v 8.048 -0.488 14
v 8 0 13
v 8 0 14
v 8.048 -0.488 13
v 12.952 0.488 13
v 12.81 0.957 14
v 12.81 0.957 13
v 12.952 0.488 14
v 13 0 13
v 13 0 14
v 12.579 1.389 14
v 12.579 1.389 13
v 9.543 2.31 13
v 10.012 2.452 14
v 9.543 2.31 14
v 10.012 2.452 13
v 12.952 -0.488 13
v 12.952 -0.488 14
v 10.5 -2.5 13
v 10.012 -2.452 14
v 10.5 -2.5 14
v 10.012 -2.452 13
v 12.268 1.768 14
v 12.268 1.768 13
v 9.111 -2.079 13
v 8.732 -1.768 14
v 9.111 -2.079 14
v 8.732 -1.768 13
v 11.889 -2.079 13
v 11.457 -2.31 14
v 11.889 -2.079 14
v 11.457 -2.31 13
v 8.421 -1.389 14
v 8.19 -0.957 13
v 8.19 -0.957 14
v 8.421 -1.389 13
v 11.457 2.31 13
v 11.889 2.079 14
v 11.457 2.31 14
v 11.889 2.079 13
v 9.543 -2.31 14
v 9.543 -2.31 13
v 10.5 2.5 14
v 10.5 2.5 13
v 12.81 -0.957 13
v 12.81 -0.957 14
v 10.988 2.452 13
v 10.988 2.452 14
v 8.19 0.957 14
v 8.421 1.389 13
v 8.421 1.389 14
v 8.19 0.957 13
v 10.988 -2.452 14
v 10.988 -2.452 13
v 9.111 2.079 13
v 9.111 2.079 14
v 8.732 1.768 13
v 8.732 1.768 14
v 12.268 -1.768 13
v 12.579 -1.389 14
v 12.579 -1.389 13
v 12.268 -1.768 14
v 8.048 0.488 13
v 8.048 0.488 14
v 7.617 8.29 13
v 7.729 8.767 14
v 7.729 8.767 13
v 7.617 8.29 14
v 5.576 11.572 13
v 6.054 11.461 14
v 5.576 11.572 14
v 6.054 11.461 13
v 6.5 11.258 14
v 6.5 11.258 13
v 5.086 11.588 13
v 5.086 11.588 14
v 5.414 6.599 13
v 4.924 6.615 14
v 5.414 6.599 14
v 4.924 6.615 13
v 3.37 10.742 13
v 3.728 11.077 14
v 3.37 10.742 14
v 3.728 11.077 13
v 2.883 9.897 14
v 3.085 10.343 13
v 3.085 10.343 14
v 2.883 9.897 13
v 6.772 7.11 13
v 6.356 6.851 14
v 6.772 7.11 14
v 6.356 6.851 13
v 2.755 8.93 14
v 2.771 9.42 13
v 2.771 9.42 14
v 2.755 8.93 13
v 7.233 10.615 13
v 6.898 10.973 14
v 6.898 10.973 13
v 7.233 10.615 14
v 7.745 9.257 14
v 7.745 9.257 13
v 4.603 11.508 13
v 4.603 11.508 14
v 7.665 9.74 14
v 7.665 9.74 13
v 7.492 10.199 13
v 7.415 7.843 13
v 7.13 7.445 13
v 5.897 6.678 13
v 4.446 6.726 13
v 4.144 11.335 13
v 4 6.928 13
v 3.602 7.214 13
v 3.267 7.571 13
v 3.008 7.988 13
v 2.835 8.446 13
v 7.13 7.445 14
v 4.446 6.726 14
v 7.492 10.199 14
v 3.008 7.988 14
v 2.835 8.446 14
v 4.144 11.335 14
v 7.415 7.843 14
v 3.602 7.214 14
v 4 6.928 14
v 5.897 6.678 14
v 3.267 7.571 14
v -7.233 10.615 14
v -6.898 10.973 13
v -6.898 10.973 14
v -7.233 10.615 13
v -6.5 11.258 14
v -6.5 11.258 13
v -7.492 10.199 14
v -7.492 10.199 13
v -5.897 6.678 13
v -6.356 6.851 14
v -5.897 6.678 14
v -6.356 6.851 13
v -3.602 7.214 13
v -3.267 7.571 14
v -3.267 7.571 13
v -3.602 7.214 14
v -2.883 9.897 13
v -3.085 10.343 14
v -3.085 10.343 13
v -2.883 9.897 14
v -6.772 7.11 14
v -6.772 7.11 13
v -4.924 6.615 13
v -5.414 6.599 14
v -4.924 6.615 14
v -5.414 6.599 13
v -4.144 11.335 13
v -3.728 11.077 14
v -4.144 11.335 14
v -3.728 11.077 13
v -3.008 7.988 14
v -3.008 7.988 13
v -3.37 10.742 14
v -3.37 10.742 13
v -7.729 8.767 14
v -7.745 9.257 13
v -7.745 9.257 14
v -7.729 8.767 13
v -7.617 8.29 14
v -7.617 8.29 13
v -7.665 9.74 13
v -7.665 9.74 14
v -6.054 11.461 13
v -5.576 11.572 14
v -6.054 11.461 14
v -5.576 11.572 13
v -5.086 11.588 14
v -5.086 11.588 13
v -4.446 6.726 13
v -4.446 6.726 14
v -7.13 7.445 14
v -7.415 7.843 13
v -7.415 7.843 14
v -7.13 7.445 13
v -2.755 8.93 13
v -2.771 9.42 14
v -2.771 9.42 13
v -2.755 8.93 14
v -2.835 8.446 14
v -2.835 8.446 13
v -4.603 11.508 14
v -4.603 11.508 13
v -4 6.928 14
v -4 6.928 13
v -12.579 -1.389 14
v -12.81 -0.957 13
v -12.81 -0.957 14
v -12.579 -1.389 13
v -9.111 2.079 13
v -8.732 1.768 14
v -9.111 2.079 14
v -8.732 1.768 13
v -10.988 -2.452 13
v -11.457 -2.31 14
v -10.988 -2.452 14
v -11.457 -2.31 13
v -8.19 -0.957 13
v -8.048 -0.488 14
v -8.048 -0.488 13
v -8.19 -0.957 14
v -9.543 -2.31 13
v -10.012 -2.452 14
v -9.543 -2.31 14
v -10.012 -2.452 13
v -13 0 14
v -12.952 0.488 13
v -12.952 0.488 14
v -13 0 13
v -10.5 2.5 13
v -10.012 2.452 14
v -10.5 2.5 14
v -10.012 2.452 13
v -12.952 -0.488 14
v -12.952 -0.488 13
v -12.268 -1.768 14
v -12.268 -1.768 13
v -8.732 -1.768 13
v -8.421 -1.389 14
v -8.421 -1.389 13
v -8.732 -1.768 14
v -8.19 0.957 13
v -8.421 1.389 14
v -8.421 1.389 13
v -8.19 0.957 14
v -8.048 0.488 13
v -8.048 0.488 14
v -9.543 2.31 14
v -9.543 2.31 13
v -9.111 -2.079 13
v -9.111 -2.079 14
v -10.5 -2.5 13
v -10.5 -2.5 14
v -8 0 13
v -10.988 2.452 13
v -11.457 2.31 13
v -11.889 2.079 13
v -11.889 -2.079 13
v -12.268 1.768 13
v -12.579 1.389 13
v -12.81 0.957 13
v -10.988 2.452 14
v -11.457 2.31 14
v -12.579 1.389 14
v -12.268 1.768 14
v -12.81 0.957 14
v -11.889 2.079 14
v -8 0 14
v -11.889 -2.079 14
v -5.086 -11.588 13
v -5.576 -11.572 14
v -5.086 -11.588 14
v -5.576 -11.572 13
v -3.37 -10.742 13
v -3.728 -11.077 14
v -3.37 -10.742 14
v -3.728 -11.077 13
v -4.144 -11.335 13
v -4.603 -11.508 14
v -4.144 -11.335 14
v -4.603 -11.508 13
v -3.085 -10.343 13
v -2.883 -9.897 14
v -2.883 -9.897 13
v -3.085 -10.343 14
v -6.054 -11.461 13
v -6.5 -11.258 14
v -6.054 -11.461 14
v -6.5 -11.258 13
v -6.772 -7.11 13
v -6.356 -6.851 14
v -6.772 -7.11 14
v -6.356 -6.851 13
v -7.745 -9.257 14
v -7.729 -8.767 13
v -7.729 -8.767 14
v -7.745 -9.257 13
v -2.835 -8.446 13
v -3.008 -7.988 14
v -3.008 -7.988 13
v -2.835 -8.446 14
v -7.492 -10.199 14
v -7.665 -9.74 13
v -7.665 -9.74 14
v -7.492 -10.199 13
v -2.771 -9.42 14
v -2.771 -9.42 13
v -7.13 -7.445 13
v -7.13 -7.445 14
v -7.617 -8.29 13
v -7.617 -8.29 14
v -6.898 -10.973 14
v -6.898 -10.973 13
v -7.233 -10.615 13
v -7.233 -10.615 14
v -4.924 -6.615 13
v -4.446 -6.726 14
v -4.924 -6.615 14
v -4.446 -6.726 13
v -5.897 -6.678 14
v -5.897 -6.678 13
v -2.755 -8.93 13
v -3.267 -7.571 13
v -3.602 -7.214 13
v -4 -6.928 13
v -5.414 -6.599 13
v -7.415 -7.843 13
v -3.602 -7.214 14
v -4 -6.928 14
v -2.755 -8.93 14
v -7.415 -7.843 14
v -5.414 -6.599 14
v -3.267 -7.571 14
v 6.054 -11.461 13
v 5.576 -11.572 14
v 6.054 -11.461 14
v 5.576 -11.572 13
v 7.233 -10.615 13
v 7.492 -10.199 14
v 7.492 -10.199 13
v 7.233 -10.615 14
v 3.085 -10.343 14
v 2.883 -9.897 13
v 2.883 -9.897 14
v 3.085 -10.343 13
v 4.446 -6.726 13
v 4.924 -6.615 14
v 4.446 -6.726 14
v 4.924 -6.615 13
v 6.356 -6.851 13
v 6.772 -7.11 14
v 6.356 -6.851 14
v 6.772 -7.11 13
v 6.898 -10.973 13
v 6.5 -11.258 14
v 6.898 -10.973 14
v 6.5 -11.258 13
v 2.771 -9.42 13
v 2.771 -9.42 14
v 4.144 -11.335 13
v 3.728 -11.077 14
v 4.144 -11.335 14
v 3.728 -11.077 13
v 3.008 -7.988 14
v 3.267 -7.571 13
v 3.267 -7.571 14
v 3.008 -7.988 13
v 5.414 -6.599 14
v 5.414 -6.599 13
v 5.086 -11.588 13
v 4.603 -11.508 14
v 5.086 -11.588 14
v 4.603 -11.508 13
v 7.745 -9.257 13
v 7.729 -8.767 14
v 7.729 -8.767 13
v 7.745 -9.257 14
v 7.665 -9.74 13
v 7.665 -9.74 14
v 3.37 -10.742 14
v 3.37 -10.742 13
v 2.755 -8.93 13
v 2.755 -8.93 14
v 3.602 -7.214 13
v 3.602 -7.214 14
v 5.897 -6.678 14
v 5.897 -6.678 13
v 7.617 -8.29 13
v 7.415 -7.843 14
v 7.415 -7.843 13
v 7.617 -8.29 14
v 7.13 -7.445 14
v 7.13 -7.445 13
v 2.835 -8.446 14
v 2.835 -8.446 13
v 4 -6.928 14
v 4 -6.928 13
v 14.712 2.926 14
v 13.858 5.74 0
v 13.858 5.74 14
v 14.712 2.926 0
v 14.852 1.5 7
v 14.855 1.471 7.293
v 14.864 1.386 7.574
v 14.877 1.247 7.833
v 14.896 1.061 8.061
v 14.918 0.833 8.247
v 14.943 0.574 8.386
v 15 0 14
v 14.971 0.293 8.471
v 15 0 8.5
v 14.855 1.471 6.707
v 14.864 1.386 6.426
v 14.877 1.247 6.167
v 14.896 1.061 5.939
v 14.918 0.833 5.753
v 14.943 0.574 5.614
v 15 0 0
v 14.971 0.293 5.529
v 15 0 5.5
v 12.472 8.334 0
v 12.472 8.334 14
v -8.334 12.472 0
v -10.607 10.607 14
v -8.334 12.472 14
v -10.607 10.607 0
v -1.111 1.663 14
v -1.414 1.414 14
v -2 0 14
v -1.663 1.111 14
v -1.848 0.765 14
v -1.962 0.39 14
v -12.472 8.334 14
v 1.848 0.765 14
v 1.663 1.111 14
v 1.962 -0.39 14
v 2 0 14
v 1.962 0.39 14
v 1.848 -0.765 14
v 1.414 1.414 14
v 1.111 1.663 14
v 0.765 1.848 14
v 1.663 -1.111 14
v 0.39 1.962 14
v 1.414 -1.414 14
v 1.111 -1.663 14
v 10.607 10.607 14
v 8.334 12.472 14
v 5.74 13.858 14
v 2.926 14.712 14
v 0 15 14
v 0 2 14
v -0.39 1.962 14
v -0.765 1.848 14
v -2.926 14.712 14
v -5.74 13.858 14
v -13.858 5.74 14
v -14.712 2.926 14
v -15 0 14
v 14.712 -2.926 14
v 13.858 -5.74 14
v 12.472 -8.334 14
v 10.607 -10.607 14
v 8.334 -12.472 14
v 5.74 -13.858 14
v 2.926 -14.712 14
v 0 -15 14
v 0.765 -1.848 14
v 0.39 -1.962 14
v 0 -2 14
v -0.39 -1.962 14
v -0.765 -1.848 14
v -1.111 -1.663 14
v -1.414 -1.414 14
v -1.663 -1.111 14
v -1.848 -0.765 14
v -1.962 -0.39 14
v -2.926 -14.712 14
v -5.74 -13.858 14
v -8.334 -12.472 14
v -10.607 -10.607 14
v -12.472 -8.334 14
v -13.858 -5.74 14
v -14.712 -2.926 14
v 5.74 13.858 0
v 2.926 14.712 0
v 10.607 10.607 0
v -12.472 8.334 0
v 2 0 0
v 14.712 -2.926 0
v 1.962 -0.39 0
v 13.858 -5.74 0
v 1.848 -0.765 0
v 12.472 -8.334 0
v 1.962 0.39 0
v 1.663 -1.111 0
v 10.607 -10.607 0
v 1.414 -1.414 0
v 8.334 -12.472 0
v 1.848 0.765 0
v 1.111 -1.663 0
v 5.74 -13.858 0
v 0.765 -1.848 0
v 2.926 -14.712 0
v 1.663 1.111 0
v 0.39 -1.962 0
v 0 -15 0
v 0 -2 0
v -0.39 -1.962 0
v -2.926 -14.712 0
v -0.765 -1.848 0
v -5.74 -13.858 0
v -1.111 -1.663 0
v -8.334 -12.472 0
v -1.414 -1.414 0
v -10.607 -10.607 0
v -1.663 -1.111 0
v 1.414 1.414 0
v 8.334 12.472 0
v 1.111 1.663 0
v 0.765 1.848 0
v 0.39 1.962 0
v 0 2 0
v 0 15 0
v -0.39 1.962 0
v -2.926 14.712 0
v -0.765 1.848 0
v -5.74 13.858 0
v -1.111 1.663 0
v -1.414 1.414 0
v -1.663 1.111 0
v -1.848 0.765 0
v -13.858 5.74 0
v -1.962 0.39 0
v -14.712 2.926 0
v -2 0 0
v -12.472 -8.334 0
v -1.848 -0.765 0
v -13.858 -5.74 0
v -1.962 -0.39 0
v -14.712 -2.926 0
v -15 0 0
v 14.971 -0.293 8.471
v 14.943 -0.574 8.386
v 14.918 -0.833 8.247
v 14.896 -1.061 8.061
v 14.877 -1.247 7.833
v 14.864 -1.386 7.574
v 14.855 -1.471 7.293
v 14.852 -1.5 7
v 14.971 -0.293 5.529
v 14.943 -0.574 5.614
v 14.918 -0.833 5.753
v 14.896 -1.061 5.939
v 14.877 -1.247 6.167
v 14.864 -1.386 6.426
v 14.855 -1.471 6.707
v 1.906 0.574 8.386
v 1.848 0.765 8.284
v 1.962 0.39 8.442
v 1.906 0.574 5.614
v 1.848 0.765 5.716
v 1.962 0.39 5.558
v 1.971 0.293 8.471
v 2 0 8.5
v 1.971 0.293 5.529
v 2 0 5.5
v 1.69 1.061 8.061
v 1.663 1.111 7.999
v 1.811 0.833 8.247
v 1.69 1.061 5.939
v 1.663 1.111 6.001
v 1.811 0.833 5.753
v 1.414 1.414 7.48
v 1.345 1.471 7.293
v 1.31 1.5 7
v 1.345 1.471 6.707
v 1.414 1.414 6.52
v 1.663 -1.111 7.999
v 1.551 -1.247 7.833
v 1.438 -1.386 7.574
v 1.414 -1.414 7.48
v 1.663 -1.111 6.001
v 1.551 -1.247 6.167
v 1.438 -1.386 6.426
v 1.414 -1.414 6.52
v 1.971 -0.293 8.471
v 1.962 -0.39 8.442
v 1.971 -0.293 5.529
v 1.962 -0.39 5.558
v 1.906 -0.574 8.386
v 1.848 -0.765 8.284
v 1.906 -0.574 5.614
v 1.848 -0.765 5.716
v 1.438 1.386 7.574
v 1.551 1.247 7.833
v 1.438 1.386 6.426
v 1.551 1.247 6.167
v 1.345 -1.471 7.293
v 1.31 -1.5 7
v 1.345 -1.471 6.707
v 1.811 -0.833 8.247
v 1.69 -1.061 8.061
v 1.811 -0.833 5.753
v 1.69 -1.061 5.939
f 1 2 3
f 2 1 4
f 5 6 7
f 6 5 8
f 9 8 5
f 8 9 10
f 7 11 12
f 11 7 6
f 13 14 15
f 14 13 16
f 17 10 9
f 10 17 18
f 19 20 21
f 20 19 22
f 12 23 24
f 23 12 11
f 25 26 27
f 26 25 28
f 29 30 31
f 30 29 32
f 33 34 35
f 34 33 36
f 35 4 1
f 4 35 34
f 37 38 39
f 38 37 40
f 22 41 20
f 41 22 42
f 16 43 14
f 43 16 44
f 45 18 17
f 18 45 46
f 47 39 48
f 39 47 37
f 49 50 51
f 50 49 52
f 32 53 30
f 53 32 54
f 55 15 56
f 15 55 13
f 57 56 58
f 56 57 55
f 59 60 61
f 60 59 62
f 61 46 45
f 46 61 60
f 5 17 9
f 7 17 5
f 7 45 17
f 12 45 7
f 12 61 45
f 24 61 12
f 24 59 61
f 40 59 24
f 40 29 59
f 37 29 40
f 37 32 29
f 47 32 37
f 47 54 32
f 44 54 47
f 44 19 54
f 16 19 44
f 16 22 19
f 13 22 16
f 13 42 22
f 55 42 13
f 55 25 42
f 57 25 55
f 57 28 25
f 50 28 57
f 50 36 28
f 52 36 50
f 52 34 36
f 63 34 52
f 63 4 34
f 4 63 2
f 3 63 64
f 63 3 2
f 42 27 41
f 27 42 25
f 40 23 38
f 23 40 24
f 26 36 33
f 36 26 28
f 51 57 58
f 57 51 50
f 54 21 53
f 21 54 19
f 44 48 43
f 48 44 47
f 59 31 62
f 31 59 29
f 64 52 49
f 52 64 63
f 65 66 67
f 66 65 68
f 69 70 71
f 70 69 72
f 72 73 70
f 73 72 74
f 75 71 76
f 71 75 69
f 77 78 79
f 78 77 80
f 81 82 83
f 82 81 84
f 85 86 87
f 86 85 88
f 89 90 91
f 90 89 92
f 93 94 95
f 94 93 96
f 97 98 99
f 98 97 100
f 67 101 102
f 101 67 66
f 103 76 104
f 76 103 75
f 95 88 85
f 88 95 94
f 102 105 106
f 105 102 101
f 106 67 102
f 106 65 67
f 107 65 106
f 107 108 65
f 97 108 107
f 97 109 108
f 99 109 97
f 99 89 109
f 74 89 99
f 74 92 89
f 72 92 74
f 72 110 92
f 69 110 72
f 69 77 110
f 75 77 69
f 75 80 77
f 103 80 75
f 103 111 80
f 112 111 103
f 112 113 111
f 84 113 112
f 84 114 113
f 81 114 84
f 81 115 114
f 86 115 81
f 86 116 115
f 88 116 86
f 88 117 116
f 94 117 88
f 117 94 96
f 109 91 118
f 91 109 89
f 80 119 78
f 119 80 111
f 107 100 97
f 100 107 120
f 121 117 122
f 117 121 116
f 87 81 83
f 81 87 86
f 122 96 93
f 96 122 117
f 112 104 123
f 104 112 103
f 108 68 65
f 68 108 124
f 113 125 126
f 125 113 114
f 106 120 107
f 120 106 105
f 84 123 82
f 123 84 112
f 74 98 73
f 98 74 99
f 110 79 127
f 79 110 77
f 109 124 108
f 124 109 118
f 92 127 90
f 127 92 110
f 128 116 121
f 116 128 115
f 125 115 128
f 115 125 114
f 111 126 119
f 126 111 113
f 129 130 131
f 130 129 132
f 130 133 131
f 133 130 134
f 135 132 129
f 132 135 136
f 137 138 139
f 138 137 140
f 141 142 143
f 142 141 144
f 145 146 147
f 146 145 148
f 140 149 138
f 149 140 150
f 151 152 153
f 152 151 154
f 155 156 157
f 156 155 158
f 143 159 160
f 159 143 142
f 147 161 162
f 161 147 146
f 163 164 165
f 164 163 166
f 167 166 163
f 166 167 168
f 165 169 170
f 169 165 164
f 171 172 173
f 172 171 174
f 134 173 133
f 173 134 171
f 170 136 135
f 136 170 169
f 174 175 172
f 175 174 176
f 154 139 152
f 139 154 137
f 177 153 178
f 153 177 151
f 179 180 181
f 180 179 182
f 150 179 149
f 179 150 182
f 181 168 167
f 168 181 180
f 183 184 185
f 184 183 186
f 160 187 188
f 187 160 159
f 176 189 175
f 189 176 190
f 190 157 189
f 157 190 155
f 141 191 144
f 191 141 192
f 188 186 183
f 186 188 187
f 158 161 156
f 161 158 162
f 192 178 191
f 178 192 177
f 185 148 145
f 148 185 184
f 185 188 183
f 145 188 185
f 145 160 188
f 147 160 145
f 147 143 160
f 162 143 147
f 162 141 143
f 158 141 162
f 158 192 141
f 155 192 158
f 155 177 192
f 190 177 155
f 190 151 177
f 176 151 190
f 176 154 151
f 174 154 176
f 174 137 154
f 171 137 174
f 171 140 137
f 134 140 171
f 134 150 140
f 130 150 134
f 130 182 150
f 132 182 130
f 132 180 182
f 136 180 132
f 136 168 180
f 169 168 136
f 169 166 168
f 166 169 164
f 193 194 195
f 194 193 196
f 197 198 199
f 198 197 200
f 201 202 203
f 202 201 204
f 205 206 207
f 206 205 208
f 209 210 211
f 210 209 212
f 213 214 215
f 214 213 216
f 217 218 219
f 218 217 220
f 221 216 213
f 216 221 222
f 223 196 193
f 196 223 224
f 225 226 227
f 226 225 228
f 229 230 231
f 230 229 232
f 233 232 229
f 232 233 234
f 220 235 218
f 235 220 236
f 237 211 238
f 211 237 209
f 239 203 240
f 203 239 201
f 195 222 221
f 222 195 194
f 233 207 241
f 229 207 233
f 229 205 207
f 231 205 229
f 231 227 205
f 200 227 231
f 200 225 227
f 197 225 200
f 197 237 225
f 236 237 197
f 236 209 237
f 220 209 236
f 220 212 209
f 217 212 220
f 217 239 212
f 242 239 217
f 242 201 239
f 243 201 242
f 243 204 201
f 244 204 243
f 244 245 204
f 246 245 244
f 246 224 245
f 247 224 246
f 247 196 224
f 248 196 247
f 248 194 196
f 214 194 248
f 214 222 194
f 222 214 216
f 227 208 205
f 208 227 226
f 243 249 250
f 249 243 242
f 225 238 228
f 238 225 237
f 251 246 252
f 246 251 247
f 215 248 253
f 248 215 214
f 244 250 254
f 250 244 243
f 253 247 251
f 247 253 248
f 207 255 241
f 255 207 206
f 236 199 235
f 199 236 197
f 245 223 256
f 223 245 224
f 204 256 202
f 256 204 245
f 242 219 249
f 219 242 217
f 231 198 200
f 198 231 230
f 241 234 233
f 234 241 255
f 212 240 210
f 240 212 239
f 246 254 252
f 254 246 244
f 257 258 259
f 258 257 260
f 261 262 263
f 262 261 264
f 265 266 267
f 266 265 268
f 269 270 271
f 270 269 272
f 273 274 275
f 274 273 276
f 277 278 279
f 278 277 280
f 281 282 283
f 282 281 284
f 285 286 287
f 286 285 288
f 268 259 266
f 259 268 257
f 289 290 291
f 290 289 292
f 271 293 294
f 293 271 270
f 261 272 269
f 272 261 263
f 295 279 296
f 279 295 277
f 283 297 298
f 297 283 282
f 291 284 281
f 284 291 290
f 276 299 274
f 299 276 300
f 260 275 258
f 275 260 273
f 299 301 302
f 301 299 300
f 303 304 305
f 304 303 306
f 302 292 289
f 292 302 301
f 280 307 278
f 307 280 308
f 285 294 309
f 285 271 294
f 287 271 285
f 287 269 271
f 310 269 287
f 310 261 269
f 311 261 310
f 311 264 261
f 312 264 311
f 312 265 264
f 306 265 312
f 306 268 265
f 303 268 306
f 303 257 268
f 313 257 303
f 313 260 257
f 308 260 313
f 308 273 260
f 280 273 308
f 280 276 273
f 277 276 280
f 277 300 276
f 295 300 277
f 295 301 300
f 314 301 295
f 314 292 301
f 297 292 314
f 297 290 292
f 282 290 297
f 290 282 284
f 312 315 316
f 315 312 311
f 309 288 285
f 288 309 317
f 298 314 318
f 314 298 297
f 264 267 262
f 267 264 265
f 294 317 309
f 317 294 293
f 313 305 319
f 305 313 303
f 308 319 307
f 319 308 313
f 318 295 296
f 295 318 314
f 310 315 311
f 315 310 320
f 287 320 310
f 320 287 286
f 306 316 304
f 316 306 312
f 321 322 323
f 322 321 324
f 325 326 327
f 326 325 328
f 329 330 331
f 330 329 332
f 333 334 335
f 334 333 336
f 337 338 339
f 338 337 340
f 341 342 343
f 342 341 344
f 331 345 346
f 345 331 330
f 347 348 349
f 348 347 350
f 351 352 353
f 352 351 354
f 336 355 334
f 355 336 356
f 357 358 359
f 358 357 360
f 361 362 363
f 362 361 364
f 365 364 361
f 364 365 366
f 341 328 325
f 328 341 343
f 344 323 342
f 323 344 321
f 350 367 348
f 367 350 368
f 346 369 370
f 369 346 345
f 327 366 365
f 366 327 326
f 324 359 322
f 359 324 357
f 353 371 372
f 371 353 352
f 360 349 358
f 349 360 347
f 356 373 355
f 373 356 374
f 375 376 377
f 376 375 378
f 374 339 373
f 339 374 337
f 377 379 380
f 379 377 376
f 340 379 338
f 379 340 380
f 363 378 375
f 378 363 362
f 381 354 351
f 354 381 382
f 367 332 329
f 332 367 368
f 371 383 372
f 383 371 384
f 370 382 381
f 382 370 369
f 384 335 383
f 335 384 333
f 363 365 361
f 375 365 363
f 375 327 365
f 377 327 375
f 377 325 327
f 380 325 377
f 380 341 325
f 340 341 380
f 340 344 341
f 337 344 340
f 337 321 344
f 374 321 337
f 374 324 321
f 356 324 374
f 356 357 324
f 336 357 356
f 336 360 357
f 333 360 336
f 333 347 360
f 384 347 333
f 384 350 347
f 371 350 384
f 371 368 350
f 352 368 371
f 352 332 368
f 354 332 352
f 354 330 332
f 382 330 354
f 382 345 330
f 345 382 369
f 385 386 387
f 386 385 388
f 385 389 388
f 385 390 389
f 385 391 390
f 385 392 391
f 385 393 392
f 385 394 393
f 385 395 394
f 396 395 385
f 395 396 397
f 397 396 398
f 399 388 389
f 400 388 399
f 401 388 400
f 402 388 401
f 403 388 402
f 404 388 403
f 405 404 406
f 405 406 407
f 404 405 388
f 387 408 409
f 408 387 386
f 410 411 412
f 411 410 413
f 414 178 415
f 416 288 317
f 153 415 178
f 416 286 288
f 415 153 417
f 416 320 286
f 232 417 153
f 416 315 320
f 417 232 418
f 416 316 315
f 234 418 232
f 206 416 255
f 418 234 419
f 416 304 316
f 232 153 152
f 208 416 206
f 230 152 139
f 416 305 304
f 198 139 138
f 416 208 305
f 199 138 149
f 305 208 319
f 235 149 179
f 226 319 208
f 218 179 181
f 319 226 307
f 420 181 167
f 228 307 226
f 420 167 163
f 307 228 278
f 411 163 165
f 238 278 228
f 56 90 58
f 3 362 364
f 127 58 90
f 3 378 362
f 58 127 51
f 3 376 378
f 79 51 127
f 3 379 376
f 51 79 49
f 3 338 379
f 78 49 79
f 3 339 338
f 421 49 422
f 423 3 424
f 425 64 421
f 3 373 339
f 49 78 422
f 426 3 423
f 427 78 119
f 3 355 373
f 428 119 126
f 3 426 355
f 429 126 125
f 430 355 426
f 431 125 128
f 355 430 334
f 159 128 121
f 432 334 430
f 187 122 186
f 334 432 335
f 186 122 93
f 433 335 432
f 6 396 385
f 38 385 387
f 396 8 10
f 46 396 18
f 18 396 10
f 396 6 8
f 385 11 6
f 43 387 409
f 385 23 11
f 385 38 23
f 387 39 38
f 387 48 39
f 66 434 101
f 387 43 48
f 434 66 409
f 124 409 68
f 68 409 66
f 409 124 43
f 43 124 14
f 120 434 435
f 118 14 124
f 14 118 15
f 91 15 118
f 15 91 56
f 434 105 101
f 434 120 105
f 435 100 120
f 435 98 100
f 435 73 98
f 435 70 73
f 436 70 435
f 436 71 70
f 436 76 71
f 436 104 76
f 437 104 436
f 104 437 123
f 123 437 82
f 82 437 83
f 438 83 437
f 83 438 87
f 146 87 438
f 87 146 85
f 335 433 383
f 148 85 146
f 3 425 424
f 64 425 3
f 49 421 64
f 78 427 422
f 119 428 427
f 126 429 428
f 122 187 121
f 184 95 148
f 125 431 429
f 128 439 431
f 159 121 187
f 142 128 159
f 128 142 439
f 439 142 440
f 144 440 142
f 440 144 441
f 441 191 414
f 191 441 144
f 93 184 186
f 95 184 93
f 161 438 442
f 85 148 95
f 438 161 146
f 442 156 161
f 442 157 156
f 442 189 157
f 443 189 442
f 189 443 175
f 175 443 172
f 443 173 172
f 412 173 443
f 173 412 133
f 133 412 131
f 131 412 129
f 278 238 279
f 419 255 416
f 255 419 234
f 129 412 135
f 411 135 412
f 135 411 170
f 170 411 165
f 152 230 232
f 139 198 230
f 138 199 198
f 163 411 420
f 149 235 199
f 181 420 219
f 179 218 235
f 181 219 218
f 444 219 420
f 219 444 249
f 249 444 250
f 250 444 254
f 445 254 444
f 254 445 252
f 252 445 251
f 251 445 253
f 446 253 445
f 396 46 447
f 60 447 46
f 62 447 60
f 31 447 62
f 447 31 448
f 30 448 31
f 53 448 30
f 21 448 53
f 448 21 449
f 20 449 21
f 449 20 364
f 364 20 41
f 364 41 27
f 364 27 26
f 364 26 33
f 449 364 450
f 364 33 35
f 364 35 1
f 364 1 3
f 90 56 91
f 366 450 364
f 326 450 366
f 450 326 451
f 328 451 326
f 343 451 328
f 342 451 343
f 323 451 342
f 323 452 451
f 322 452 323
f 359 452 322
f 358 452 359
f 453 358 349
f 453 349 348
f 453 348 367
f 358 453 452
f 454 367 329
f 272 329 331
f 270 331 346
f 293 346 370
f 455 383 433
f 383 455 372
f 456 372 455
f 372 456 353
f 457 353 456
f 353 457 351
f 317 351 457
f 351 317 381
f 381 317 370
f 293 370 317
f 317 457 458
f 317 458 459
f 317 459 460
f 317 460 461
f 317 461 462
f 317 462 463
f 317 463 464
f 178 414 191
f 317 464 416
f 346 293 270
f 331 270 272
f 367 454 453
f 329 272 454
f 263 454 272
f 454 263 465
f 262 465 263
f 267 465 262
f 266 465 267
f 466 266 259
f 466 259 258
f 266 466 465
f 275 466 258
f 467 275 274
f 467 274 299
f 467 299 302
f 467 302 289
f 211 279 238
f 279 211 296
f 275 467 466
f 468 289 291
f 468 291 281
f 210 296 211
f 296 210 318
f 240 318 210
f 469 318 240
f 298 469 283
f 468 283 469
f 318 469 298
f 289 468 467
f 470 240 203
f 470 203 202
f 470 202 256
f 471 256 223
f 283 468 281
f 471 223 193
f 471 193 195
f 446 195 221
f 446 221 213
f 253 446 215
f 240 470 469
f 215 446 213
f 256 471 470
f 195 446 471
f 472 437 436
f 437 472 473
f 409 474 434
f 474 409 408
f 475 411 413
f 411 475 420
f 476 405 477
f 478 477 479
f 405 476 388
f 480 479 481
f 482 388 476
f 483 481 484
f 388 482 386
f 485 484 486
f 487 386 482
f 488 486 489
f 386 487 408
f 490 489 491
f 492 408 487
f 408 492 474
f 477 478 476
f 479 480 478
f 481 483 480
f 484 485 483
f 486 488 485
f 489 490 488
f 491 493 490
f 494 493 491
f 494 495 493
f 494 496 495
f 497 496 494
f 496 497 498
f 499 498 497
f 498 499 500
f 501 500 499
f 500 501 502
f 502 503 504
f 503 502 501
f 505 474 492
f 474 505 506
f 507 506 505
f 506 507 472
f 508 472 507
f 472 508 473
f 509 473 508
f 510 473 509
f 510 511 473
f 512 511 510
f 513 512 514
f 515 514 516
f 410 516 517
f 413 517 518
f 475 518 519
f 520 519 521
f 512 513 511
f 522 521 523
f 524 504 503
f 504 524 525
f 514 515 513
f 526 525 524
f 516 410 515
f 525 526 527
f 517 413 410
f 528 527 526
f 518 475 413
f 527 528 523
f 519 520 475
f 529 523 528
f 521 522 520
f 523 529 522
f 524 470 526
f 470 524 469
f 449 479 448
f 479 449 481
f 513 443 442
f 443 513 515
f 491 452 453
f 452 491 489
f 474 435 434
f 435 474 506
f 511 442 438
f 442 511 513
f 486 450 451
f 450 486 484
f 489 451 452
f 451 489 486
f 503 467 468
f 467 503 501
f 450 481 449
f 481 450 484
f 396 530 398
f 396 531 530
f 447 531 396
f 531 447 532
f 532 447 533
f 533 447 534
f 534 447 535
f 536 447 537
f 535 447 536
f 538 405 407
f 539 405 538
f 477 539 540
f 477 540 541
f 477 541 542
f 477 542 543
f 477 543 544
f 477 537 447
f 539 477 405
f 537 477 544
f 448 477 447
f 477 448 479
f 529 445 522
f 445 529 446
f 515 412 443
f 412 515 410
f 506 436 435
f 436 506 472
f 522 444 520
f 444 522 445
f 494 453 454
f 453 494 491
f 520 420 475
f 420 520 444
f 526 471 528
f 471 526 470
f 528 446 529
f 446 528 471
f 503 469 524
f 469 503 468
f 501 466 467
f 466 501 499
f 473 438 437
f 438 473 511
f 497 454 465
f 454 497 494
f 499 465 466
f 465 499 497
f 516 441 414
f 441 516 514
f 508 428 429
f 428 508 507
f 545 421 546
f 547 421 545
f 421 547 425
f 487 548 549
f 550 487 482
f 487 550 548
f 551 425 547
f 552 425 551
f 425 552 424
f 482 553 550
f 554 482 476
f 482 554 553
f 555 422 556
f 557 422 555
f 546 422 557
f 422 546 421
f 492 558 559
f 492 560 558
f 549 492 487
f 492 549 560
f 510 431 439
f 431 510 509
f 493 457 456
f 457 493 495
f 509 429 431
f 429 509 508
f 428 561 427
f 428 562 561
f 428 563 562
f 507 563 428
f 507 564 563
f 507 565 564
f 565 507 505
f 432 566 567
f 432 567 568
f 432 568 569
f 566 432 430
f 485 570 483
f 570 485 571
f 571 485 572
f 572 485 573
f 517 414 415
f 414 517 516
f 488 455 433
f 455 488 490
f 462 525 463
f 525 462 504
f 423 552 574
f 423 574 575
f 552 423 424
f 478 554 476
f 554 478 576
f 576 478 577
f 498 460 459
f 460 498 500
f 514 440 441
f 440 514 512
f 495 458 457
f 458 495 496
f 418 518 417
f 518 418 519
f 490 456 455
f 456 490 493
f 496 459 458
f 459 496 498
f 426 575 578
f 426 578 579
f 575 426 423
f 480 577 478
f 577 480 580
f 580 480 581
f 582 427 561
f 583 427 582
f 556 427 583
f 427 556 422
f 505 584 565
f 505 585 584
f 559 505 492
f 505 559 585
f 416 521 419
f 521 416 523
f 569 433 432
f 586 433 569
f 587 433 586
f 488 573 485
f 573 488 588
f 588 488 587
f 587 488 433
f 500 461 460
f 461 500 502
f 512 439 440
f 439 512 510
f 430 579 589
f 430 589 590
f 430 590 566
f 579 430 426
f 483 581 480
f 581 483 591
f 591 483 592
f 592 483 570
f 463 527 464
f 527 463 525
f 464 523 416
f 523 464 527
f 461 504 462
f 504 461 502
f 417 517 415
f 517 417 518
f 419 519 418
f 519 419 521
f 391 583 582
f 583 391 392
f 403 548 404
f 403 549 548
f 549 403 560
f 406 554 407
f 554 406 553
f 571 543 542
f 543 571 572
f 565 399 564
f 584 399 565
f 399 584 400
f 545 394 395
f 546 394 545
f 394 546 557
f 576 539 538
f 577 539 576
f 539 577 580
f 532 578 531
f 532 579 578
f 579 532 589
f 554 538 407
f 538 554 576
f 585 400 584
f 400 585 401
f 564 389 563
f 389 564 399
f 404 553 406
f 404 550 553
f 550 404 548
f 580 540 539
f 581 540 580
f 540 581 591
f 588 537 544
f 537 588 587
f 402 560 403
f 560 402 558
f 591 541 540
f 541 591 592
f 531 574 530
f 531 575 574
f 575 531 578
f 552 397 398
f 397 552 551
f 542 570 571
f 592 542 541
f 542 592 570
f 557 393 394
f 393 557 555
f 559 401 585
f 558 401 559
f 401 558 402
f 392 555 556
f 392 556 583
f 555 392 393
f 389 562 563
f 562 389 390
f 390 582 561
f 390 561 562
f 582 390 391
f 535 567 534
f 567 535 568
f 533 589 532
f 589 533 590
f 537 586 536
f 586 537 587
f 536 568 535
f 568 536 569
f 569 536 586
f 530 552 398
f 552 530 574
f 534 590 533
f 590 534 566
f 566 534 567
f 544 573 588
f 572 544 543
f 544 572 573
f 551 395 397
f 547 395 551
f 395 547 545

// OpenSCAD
$fn = 32;

// ----------------------------------------------------------------------
// Control knob: dimpled knob
// ----------------------------------------------------------------------

// --- parameters (mm) ---
dimp_d = 5;               // finger dimple diameter
n_dimp = 6;               // number of dimples
dimp_r = 10.5;            // dimple ring radius
knob_d = 30;              // knob body diameter
knob_h = 14;              // knob body height
bore_d = 4;               // shaft bore diameter
set_d = 3;                // set screw bore diameter

dimp_step = 360 / n_dimp;  // dimple angular step

difference() {
  cylinder(h = knob_h, d = knob_d);
  translate([0, 0, -1]) cylinder(h = knob_h + 2, d = bore_d);
  translate([-1, 0, knob_h / 2]) rotate([0, 90, 0])
    cylinder(h = knob_d / 2 + bore_d / 2 + 2, d = set_d);  for (i = [0 : n_dimp - 1])
    rotate([0, 0, i * dimp_step])
      translate([dimp_r, 0, knob_h - 1])
        cylinder(h = 2, d = dimp_d);
}
